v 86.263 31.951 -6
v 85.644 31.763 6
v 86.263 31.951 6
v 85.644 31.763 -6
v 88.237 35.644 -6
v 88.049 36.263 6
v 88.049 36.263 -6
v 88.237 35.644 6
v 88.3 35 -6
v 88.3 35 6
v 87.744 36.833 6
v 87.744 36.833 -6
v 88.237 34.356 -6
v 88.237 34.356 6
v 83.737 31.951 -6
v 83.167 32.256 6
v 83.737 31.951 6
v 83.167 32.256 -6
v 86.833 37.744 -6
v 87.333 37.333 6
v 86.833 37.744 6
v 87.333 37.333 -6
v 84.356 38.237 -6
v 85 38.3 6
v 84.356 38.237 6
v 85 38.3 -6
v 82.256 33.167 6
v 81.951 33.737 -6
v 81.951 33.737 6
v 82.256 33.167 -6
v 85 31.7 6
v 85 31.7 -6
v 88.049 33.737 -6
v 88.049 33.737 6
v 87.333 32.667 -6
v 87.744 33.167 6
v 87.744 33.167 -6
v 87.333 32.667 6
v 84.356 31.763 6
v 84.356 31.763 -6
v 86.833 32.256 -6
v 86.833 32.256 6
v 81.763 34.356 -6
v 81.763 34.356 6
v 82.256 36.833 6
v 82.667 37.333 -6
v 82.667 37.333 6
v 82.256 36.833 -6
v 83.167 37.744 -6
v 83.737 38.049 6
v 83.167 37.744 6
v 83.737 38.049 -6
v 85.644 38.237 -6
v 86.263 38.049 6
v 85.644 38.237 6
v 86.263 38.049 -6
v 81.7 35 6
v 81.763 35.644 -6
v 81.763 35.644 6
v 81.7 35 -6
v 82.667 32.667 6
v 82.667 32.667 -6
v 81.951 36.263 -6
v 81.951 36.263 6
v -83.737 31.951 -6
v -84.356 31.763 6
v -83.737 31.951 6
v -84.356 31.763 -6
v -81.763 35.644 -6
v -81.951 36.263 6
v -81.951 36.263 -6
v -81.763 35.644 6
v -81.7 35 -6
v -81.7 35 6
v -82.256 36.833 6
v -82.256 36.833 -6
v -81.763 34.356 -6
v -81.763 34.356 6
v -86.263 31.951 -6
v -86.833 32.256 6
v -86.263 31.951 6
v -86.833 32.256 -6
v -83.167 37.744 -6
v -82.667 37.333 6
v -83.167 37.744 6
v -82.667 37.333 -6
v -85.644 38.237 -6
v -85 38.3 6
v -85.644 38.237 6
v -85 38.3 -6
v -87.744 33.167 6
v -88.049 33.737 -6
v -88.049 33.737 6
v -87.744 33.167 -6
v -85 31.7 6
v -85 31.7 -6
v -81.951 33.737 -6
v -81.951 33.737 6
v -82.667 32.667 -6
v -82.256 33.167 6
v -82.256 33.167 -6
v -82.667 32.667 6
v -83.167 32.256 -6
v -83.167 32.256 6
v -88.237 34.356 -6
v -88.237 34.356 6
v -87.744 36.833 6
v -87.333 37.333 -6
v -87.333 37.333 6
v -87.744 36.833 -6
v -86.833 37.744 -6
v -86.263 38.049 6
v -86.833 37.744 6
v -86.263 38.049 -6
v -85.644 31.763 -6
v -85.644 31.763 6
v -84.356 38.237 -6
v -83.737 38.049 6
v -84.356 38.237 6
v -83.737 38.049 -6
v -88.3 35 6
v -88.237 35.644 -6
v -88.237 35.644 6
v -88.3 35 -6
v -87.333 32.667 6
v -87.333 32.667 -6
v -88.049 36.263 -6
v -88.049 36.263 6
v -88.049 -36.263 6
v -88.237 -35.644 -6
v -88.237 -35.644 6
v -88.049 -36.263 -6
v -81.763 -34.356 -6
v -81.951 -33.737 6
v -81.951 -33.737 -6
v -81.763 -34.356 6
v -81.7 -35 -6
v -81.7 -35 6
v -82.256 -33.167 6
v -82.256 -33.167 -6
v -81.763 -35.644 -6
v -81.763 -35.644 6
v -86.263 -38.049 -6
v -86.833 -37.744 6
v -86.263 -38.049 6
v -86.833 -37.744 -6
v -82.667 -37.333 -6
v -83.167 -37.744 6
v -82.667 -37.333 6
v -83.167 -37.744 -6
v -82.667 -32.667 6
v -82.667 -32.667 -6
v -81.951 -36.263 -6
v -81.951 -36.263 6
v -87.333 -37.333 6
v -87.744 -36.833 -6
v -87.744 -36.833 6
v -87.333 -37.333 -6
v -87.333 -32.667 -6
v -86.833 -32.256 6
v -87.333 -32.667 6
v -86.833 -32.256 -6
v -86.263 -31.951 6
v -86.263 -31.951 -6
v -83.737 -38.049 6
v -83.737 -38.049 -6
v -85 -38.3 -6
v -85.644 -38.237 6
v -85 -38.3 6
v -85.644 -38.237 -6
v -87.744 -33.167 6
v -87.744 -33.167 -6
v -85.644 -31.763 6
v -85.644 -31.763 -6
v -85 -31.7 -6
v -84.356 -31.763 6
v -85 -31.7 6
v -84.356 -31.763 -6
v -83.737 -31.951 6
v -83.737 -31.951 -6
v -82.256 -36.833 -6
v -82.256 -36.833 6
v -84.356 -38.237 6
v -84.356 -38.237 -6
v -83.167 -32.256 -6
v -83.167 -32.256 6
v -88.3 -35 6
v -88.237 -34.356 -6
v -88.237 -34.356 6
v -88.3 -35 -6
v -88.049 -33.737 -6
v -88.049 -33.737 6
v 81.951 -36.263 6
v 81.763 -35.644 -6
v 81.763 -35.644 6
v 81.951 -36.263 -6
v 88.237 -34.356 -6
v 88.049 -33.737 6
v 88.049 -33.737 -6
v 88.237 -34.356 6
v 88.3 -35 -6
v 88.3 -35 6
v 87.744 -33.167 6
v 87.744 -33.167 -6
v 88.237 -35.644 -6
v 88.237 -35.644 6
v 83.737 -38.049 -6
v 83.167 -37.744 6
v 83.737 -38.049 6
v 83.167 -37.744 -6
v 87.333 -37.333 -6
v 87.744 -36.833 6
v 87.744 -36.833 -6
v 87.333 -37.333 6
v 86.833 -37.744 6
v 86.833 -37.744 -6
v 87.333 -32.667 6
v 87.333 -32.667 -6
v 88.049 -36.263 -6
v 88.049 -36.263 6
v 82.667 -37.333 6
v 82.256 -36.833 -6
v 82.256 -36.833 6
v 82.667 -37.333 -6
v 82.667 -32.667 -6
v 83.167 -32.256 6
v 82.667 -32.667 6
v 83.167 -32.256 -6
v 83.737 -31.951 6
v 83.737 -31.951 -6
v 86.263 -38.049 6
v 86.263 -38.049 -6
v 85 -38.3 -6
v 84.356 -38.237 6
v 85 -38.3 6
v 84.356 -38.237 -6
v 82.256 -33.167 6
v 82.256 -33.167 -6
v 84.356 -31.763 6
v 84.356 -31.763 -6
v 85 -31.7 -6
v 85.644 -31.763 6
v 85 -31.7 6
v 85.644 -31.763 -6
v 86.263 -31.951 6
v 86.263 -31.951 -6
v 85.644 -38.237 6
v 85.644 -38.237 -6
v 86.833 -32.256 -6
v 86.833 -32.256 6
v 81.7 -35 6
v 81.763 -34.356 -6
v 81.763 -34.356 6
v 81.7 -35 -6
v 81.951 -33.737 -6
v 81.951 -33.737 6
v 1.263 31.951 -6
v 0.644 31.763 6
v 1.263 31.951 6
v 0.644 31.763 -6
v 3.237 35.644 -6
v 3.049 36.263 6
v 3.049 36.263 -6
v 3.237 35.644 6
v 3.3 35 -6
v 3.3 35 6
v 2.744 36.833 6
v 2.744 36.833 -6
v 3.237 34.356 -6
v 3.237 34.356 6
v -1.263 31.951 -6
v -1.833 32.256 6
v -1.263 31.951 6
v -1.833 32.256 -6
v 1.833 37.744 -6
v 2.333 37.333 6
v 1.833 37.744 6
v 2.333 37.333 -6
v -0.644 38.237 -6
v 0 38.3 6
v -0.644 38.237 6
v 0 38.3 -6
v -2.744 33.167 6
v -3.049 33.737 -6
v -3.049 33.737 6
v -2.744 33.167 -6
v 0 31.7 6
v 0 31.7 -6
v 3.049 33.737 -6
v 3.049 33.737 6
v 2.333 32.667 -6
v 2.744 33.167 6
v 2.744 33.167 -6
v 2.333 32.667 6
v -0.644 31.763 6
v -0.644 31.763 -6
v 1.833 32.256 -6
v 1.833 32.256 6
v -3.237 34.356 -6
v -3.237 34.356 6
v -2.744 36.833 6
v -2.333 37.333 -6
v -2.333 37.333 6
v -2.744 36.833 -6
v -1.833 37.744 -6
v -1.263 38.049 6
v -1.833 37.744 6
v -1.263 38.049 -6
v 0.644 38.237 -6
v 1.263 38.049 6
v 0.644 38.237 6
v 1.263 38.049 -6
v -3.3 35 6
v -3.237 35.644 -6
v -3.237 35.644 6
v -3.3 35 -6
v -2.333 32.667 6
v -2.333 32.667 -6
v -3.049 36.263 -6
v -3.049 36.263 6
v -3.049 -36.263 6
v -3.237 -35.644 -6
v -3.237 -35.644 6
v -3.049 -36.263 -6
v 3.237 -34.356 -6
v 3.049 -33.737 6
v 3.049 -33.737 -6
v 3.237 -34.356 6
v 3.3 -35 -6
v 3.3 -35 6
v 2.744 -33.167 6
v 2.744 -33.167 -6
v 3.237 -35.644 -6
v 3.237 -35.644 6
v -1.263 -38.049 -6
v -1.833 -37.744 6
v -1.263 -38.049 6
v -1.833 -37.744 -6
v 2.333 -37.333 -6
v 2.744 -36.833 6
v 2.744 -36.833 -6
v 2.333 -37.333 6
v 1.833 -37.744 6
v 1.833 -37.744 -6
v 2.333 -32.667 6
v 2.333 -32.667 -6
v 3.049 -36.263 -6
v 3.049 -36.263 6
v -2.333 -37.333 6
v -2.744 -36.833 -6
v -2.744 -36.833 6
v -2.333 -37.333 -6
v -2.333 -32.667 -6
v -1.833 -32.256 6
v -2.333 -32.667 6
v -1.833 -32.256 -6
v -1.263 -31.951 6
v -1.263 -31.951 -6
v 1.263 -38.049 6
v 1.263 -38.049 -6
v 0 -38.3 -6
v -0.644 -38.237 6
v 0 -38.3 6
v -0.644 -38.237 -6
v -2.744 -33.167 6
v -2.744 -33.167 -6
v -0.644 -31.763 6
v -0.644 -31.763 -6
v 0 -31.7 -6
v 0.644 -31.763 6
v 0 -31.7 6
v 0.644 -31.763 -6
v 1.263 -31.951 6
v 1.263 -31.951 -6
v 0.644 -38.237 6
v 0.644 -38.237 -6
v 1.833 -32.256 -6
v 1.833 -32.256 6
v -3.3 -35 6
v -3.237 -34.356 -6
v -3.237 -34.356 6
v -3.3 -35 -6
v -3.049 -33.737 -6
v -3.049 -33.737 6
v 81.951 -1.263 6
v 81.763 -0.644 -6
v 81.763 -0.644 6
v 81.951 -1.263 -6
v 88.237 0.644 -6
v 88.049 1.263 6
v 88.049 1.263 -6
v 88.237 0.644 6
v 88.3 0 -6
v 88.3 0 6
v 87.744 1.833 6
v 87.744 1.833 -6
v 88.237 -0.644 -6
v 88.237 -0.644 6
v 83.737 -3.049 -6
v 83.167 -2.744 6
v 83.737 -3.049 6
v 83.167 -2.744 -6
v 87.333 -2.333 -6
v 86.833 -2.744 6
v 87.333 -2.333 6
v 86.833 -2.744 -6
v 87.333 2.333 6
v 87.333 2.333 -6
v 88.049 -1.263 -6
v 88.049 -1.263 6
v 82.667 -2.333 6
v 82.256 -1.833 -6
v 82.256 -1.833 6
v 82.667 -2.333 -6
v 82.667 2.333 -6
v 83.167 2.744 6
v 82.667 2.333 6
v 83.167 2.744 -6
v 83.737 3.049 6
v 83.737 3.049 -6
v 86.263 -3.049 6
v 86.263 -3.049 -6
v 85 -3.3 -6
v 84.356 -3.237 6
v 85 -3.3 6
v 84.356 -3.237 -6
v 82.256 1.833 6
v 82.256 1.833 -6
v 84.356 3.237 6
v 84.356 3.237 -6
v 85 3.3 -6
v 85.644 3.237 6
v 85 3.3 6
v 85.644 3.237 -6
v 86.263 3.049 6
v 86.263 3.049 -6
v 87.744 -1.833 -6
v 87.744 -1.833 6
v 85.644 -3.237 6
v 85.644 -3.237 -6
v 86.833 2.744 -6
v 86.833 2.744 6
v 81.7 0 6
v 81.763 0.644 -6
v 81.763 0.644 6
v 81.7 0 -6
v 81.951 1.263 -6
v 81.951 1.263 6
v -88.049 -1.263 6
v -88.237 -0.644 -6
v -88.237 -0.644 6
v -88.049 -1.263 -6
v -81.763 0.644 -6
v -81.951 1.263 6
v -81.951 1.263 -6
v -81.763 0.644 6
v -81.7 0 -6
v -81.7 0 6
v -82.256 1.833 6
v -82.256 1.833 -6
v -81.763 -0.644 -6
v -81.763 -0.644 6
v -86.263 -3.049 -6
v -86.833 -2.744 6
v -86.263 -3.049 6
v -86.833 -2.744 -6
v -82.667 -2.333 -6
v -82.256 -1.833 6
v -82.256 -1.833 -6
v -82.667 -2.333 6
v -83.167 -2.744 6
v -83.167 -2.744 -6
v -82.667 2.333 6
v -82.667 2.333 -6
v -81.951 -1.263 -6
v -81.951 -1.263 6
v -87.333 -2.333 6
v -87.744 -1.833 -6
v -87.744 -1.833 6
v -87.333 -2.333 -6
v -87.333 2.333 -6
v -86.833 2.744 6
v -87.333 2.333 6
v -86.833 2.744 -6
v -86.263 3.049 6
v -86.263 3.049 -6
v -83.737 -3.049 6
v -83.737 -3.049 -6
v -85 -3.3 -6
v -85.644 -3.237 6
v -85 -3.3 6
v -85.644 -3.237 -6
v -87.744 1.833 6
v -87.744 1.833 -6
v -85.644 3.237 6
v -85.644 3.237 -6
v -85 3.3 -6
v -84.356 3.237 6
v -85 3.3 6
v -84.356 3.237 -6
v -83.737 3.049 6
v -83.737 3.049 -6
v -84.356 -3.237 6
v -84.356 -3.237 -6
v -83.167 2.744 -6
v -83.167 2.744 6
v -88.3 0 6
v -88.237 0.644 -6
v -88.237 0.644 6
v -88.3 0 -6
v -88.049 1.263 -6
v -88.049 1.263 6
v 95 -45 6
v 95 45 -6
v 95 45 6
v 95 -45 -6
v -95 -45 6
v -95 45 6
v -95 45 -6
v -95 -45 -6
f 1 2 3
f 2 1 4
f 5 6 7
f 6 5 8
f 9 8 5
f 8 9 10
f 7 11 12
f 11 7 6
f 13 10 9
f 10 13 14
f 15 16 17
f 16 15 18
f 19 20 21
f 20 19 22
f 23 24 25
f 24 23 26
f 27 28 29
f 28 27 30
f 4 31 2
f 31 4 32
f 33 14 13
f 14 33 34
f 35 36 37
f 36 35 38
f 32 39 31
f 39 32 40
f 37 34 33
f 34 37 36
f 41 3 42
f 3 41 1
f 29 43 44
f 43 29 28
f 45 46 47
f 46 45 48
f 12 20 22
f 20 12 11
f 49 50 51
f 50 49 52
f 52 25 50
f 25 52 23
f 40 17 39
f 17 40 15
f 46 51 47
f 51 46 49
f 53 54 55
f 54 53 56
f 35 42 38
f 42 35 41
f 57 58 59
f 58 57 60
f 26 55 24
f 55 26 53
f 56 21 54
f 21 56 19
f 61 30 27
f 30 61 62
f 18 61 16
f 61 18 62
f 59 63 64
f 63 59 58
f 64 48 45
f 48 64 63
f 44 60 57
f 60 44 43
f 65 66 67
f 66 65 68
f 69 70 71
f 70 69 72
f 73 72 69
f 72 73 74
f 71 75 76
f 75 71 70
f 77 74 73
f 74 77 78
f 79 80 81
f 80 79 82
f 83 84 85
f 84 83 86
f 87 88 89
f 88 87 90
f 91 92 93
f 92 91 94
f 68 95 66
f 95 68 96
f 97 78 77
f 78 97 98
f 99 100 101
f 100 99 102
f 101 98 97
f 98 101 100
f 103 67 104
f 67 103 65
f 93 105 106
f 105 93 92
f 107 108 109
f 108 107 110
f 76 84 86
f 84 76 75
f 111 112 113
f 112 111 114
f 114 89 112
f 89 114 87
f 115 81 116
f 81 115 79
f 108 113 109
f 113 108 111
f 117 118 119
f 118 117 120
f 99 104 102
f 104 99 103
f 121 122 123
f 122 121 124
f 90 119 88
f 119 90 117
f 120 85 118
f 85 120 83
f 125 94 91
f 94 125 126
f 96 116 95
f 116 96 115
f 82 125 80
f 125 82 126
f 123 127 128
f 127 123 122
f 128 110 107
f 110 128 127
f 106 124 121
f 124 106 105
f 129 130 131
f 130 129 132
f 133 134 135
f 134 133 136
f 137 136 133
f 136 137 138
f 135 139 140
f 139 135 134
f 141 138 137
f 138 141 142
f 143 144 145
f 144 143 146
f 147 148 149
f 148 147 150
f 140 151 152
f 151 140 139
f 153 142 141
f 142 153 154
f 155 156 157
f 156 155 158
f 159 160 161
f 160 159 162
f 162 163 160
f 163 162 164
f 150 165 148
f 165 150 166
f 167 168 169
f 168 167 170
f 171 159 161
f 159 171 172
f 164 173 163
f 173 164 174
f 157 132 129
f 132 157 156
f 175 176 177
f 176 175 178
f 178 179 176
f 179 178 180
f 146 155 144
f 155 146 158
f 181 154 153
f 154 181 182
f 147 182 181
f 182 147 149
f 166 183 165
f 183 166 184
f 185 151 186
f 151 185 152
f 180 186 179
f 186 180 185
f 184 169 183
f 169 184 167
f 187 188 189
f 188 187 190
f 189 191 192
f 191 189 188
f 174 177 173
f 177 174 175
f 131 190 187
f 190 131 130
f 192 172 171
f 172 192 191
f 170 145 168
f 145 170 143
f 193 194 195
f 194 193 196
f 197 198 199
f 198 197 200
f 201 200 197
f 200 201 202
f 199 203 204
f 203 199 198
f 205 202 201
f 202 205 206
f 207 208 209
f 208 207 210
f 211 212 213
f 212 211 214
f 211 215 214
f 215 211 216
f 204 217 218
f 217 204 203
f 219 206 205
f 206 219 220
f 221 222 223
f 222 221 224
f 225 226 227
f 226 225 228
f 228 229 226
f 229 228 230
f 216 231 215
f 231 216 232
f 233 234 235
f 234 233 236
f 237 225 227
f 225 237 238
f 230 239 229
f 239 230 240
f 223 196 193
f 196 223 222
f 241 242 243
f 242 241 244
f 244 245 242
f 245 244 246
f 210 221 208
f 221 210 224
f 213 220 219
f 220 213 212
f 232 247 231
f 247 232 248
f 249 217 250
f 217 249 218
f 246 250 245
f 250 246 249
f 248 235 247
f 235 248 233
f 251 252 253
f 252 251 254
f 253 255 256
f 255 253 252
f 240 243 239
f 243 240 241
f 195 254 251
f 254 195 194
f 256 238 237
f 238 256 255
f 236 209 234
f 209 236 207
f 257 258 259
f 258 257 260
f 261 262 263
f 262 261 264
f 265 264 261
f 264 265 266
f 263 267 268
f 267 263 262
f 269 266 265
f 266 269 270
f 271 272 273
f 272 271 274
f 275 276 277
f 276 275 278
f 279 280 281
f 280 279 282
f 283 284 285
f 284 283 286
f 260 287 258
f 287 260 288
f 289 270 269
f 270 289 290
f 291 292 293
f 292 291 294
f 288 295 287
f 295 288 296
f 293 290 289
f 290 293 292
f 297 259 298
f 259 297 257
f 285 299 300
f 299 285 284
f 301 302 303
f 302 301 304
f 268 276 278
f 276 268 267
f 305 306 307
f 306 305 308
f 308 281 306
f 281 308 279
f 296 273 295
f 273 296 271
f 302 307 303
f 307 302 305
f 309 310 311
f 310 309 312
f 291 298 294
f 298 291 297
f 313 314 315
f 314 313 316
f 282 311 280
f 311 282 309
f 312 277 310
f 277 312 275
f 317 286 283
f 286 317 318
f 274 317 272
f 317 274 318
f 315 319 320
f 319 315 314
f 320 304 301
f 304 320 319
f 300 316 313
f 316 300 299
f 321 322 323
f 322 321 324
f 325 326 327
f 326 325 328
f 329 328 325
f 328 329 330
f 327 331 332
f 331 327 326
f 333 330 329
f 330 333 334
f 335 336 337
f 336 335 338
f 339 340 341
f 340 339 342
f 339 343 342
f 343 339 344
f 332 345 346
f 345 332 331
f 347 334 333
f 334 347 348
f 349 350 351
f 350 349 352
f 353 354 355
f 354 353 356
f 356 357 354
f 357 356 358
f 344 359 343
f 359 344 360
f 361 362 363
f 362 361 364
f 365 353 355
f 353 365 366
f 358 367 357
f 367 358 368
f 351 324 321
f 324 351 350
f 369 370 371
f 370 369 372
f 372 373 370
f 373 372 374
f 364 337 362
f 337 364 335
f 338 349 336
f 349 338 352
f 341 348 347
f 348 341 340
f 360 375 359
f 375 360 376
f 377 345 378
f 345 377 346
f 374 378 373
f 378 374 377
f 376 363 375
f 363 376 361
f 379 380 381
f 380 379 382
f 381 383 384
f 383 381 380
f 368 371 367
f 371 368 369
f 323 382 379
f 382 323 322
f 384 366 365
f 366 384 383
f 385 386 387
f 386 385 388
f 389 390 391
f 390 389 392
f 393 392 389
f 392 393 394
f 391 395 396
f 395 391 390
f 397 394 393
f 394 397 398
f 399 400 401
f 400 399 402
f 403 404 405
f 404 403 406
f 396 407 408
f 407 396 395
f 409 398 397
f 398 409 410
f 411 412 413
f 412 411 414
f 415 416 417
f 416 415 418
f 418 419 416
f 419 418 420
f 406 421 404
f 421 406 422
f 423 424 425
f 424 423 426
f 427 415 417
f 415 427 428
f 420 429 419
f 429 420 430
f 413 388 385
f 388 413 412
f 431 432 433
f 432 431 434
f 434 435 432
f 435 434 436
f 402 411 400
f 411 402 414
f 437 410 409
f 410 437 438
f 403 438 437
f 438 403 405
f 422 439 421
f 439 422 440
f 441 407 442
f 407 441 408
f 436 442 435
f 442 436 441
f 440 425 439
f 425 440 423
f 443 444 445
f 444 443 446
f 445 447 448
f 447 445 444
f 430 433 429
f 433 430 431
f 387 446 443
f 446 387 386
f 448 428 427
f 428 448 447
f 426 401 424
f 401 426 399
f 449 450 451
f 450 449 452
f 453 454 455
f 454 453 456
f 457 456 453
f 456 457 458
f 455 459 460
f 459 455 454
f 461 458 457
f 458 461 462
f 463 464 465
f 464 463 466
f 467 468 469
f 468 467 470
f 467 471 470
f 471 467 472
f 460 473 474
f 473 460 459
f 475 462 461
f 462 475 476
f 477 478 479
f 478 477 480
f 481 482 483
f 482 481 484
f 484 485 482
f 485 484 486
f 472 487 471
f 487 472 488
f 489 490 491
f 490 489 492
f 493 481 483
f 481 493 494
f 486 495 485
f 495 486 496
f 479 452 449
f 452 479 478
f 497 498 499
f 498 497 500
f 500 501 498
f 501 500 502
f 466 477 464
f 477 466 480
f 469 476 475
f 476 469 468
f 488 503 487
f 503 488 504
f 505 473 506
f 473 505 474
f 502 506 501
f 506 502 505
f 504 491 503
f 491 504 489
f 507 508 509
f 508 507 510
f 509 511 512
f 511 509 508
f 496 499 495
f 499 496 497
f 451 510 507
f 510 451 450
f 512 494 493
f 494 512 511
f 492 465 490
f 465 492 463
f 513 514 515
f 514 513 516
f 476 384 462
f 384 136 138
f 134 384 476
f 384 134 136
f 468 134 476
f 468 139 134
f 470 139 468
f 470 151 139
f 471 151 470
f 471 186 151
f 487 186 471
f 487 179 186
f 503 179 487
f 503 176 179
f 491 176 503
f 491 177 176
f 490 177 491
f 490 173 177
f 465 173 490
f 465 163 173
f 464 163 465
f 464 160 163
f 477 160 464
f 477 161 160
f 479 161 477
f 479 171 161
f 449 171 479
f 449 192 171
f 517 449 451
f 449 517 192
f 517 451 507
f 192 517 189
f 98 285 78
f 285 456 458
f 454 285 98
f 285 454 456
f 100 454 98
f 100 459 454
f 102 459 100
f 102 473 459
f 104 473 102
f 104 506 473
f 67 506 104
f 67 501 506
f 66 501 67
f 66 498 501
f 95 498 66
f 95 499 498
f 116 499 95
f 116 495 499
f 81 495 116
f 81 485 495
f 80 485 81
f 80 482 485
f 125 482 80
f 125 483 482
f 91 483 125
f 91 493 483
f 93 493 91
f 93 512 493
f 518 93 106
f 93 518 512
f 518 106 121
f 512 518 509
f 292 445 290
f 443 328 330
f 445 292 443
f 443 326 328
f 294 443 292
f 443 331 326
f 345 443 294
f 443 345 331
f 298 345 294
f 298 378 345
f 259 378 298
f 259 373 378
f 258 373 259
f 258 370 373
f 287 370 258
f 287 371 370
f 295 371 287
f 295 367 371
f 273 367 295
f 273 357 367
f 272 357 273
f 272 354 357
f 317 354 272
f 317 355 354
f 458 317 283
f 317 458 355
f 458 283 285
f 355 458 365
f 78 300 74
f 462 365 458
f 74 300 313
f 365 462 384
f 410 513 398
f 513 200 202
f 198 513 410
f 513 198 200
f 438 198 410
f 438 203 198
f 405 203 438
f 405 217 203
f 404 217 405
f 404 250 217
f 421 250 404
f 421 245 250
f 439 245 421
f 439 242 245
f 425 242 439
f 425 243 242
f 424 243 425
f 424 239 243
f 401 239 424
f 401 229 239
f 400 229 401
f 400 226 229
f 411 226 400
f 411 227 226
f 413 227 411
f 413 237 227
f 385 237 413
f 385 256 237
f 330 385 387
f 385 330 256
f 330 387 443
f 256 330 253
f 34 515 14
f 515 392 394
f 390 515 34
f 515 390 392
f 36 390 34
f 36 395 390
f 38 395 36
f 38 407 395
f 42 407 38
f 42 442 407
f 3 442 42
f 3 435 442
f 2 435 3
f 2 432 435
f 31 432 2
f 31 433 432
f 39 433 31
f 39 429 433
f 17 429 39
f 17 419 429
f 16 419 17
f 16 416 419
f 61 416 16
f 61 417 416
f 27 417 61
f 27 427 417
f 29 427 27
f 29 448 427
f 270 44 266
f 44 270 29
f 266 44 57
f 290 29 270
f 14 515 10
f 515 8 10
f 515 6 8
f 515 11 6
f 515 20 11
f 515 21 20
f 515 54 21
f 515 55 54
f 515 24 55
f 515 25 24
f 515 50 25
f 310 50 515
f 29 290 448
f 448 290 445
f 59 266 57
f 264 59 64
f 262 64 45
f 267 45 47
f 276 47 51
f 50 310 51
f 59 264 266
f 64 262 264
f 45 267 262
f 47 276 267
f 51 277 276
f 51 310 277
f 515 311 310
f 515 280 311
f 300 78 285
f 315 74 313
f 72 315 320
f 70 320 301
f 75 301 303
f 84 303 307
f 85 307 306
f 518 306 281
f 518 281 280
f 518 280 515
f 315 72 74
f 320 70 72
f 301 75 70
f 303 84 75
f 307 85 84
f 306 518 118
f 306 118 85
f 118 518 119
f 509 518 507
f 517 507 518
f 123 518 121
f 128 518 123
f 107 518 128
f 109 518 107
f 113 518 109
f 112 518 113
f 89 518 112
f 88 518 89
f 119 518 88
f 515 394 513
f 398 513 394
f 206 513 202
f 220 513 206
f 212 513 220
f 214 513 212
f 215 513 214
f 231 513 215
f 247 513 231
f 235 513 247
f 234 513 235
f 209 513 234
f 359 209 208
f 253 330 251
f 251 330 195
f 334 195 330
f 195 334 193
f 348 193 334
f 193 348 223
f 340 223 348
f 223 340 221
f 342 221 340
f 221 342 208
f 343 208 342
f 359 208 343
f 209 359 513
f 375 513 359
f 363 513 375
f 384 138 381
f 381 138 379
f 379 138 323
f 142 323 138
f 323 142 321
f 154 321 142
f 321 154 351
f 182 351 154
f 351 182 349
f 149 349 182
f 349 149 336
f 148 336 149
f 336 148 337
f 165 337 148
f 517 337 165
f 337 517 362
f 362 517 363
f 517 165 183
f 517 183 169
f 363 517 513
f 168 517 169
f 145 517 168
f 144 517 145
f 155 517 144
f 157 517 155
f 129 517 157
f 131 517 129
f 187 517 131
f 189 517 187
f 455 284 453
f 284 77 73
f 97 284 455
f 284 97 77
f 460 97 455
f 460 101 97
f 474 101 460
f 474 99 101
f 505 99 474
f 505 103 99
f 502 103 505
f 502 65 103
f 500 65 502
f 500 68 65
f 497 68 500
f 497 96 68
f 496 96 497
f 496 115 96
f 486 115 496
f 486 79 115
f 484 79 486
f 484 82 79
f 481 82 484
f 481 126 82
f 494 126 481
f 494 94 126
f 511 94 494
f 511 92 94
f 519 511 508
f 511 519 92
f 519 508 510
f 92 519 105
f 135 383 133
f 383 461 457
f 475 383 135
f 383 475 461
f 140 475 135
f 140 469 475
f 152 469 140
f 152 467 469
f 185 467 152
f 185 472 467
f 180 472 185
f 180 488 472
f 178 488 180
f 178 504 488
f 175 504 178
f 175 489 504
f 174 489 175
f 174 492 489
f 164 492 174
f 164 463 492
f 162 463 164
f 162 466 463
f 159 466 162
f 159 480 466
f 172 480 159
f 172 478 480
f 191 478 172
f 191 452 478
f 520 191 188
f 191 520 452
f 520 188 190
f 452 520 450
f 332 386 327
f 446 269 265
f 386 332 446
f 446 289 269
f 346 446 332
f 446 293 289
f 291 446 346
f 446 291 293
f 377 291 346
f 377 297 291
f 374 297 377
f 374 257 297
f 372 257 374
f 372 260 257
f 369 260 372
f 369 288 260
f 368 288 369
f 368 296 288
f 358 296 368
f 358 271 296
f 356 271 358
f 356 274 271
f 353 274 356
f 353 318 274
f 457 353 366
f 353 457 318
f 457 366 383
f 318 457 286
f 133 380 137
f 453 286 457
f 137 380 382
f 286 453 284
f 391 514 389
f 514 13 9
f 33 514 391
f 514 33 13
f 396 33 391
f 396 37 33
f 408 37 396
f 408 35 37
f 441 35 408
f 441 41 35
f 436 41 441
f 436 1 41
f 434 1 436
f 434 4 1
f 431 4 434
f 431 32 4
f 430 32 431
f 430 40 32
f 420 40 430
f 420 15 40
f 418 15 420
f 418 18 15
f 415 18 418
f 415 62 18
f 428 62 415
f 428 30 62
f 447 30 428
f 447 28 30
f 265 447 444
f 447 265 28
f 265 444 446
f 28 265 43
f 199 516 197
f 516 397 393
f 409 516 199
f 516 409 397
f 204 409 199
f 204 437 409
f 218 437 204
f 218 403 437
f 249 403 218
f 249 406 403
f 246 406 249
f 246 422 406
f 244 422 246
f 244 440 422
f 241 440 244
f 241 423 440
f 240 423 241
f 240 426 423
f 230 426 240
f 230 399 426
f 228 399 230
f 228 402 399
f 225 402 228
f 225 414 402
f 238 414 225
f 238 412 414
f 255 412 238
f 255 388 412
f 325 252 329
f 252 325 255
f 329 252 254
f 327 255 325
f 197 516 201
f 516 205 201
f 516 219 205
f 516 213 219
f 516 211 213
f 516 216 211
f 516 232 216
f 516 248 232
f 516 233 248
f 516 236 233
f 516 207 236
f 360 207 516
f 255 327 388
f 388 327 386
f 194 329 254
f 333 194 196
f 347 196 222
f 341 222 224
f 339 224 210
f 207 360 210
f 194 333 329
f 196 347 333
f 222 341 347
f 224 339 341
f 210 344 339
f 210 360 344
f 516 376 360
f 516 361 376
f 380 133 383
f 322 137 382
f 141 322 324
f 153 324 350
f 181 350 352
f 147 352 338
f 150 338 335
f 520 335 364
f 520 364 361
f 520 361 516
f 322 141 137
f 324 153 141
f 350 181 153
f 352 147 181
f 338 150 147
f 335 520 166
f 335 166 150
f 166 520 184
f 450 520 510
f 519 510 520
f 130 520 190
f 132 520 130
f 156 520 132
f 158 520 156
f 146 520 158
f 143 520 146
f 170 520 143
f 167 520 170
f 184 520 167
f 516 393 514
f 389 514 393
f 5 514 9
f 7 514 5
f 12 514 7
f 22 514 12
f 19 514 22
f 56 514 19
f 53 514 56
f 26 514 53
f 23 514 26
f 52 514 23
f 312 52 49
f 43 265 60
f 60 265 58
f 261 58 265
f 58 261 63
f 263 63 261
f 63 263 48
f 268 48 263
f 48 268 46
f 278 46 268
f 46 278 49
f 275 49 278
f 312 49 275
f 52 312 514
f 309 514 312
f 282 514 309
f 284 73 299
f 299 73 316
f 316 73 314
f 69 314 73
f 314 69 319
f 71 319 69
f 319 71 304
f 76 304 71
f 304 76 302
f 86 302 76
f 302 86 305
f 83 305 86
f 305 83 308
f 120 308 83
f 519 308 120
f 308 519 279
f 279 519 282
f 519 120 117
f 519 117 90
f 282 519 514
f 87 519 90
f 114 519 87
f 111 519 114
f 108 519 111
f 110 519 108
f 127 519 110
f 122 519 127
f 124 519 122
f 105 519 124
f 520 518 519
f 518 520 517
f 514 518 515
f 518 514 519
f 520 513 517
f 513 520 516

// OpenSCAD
$fn = 32;

// ----------------------------------------------------------------------
// Corner plate 190 x 90 x 12
// 8 holes, centres taken from the edge offset
// ----------------------------------------------------------------------

// --- parameters (mm) ---
plate = [190, 90, 12];  // overall size (x, y, z)
holes = 8;              // number of holes the drawing asks for
hole_d = 6.6;           // hole diameter
edge = 10;              // hole centre offset from the plate edge

// --- derived feature positions (mm) ---
corner_x = plate[0] / 2 - edge;  // = 85   corner hole X
corner_y = plate[1] / 2 - edge;  // = 35   corner hole Y
feature_centers = [
  [corner_x, corner_y],
  [-corner_x, corner_y],
  [-corner_x, -corner_y],
  [corner_x, -corner_y],
  [0, corner_y],
  [0, -corner_y],
  [corner_x, 0],
  [-corner_x, 0]
];   // hole centres the loop below drills

// plate outline, every hole drilled through with the same cutters
difference() {
  cube(plate, center = true);
  for (centre = feature_centers)
    translate([centre[0], centre[1], 0])
      cylinder(d = hole_d, h = plate[2] + 2, center = true);
}
